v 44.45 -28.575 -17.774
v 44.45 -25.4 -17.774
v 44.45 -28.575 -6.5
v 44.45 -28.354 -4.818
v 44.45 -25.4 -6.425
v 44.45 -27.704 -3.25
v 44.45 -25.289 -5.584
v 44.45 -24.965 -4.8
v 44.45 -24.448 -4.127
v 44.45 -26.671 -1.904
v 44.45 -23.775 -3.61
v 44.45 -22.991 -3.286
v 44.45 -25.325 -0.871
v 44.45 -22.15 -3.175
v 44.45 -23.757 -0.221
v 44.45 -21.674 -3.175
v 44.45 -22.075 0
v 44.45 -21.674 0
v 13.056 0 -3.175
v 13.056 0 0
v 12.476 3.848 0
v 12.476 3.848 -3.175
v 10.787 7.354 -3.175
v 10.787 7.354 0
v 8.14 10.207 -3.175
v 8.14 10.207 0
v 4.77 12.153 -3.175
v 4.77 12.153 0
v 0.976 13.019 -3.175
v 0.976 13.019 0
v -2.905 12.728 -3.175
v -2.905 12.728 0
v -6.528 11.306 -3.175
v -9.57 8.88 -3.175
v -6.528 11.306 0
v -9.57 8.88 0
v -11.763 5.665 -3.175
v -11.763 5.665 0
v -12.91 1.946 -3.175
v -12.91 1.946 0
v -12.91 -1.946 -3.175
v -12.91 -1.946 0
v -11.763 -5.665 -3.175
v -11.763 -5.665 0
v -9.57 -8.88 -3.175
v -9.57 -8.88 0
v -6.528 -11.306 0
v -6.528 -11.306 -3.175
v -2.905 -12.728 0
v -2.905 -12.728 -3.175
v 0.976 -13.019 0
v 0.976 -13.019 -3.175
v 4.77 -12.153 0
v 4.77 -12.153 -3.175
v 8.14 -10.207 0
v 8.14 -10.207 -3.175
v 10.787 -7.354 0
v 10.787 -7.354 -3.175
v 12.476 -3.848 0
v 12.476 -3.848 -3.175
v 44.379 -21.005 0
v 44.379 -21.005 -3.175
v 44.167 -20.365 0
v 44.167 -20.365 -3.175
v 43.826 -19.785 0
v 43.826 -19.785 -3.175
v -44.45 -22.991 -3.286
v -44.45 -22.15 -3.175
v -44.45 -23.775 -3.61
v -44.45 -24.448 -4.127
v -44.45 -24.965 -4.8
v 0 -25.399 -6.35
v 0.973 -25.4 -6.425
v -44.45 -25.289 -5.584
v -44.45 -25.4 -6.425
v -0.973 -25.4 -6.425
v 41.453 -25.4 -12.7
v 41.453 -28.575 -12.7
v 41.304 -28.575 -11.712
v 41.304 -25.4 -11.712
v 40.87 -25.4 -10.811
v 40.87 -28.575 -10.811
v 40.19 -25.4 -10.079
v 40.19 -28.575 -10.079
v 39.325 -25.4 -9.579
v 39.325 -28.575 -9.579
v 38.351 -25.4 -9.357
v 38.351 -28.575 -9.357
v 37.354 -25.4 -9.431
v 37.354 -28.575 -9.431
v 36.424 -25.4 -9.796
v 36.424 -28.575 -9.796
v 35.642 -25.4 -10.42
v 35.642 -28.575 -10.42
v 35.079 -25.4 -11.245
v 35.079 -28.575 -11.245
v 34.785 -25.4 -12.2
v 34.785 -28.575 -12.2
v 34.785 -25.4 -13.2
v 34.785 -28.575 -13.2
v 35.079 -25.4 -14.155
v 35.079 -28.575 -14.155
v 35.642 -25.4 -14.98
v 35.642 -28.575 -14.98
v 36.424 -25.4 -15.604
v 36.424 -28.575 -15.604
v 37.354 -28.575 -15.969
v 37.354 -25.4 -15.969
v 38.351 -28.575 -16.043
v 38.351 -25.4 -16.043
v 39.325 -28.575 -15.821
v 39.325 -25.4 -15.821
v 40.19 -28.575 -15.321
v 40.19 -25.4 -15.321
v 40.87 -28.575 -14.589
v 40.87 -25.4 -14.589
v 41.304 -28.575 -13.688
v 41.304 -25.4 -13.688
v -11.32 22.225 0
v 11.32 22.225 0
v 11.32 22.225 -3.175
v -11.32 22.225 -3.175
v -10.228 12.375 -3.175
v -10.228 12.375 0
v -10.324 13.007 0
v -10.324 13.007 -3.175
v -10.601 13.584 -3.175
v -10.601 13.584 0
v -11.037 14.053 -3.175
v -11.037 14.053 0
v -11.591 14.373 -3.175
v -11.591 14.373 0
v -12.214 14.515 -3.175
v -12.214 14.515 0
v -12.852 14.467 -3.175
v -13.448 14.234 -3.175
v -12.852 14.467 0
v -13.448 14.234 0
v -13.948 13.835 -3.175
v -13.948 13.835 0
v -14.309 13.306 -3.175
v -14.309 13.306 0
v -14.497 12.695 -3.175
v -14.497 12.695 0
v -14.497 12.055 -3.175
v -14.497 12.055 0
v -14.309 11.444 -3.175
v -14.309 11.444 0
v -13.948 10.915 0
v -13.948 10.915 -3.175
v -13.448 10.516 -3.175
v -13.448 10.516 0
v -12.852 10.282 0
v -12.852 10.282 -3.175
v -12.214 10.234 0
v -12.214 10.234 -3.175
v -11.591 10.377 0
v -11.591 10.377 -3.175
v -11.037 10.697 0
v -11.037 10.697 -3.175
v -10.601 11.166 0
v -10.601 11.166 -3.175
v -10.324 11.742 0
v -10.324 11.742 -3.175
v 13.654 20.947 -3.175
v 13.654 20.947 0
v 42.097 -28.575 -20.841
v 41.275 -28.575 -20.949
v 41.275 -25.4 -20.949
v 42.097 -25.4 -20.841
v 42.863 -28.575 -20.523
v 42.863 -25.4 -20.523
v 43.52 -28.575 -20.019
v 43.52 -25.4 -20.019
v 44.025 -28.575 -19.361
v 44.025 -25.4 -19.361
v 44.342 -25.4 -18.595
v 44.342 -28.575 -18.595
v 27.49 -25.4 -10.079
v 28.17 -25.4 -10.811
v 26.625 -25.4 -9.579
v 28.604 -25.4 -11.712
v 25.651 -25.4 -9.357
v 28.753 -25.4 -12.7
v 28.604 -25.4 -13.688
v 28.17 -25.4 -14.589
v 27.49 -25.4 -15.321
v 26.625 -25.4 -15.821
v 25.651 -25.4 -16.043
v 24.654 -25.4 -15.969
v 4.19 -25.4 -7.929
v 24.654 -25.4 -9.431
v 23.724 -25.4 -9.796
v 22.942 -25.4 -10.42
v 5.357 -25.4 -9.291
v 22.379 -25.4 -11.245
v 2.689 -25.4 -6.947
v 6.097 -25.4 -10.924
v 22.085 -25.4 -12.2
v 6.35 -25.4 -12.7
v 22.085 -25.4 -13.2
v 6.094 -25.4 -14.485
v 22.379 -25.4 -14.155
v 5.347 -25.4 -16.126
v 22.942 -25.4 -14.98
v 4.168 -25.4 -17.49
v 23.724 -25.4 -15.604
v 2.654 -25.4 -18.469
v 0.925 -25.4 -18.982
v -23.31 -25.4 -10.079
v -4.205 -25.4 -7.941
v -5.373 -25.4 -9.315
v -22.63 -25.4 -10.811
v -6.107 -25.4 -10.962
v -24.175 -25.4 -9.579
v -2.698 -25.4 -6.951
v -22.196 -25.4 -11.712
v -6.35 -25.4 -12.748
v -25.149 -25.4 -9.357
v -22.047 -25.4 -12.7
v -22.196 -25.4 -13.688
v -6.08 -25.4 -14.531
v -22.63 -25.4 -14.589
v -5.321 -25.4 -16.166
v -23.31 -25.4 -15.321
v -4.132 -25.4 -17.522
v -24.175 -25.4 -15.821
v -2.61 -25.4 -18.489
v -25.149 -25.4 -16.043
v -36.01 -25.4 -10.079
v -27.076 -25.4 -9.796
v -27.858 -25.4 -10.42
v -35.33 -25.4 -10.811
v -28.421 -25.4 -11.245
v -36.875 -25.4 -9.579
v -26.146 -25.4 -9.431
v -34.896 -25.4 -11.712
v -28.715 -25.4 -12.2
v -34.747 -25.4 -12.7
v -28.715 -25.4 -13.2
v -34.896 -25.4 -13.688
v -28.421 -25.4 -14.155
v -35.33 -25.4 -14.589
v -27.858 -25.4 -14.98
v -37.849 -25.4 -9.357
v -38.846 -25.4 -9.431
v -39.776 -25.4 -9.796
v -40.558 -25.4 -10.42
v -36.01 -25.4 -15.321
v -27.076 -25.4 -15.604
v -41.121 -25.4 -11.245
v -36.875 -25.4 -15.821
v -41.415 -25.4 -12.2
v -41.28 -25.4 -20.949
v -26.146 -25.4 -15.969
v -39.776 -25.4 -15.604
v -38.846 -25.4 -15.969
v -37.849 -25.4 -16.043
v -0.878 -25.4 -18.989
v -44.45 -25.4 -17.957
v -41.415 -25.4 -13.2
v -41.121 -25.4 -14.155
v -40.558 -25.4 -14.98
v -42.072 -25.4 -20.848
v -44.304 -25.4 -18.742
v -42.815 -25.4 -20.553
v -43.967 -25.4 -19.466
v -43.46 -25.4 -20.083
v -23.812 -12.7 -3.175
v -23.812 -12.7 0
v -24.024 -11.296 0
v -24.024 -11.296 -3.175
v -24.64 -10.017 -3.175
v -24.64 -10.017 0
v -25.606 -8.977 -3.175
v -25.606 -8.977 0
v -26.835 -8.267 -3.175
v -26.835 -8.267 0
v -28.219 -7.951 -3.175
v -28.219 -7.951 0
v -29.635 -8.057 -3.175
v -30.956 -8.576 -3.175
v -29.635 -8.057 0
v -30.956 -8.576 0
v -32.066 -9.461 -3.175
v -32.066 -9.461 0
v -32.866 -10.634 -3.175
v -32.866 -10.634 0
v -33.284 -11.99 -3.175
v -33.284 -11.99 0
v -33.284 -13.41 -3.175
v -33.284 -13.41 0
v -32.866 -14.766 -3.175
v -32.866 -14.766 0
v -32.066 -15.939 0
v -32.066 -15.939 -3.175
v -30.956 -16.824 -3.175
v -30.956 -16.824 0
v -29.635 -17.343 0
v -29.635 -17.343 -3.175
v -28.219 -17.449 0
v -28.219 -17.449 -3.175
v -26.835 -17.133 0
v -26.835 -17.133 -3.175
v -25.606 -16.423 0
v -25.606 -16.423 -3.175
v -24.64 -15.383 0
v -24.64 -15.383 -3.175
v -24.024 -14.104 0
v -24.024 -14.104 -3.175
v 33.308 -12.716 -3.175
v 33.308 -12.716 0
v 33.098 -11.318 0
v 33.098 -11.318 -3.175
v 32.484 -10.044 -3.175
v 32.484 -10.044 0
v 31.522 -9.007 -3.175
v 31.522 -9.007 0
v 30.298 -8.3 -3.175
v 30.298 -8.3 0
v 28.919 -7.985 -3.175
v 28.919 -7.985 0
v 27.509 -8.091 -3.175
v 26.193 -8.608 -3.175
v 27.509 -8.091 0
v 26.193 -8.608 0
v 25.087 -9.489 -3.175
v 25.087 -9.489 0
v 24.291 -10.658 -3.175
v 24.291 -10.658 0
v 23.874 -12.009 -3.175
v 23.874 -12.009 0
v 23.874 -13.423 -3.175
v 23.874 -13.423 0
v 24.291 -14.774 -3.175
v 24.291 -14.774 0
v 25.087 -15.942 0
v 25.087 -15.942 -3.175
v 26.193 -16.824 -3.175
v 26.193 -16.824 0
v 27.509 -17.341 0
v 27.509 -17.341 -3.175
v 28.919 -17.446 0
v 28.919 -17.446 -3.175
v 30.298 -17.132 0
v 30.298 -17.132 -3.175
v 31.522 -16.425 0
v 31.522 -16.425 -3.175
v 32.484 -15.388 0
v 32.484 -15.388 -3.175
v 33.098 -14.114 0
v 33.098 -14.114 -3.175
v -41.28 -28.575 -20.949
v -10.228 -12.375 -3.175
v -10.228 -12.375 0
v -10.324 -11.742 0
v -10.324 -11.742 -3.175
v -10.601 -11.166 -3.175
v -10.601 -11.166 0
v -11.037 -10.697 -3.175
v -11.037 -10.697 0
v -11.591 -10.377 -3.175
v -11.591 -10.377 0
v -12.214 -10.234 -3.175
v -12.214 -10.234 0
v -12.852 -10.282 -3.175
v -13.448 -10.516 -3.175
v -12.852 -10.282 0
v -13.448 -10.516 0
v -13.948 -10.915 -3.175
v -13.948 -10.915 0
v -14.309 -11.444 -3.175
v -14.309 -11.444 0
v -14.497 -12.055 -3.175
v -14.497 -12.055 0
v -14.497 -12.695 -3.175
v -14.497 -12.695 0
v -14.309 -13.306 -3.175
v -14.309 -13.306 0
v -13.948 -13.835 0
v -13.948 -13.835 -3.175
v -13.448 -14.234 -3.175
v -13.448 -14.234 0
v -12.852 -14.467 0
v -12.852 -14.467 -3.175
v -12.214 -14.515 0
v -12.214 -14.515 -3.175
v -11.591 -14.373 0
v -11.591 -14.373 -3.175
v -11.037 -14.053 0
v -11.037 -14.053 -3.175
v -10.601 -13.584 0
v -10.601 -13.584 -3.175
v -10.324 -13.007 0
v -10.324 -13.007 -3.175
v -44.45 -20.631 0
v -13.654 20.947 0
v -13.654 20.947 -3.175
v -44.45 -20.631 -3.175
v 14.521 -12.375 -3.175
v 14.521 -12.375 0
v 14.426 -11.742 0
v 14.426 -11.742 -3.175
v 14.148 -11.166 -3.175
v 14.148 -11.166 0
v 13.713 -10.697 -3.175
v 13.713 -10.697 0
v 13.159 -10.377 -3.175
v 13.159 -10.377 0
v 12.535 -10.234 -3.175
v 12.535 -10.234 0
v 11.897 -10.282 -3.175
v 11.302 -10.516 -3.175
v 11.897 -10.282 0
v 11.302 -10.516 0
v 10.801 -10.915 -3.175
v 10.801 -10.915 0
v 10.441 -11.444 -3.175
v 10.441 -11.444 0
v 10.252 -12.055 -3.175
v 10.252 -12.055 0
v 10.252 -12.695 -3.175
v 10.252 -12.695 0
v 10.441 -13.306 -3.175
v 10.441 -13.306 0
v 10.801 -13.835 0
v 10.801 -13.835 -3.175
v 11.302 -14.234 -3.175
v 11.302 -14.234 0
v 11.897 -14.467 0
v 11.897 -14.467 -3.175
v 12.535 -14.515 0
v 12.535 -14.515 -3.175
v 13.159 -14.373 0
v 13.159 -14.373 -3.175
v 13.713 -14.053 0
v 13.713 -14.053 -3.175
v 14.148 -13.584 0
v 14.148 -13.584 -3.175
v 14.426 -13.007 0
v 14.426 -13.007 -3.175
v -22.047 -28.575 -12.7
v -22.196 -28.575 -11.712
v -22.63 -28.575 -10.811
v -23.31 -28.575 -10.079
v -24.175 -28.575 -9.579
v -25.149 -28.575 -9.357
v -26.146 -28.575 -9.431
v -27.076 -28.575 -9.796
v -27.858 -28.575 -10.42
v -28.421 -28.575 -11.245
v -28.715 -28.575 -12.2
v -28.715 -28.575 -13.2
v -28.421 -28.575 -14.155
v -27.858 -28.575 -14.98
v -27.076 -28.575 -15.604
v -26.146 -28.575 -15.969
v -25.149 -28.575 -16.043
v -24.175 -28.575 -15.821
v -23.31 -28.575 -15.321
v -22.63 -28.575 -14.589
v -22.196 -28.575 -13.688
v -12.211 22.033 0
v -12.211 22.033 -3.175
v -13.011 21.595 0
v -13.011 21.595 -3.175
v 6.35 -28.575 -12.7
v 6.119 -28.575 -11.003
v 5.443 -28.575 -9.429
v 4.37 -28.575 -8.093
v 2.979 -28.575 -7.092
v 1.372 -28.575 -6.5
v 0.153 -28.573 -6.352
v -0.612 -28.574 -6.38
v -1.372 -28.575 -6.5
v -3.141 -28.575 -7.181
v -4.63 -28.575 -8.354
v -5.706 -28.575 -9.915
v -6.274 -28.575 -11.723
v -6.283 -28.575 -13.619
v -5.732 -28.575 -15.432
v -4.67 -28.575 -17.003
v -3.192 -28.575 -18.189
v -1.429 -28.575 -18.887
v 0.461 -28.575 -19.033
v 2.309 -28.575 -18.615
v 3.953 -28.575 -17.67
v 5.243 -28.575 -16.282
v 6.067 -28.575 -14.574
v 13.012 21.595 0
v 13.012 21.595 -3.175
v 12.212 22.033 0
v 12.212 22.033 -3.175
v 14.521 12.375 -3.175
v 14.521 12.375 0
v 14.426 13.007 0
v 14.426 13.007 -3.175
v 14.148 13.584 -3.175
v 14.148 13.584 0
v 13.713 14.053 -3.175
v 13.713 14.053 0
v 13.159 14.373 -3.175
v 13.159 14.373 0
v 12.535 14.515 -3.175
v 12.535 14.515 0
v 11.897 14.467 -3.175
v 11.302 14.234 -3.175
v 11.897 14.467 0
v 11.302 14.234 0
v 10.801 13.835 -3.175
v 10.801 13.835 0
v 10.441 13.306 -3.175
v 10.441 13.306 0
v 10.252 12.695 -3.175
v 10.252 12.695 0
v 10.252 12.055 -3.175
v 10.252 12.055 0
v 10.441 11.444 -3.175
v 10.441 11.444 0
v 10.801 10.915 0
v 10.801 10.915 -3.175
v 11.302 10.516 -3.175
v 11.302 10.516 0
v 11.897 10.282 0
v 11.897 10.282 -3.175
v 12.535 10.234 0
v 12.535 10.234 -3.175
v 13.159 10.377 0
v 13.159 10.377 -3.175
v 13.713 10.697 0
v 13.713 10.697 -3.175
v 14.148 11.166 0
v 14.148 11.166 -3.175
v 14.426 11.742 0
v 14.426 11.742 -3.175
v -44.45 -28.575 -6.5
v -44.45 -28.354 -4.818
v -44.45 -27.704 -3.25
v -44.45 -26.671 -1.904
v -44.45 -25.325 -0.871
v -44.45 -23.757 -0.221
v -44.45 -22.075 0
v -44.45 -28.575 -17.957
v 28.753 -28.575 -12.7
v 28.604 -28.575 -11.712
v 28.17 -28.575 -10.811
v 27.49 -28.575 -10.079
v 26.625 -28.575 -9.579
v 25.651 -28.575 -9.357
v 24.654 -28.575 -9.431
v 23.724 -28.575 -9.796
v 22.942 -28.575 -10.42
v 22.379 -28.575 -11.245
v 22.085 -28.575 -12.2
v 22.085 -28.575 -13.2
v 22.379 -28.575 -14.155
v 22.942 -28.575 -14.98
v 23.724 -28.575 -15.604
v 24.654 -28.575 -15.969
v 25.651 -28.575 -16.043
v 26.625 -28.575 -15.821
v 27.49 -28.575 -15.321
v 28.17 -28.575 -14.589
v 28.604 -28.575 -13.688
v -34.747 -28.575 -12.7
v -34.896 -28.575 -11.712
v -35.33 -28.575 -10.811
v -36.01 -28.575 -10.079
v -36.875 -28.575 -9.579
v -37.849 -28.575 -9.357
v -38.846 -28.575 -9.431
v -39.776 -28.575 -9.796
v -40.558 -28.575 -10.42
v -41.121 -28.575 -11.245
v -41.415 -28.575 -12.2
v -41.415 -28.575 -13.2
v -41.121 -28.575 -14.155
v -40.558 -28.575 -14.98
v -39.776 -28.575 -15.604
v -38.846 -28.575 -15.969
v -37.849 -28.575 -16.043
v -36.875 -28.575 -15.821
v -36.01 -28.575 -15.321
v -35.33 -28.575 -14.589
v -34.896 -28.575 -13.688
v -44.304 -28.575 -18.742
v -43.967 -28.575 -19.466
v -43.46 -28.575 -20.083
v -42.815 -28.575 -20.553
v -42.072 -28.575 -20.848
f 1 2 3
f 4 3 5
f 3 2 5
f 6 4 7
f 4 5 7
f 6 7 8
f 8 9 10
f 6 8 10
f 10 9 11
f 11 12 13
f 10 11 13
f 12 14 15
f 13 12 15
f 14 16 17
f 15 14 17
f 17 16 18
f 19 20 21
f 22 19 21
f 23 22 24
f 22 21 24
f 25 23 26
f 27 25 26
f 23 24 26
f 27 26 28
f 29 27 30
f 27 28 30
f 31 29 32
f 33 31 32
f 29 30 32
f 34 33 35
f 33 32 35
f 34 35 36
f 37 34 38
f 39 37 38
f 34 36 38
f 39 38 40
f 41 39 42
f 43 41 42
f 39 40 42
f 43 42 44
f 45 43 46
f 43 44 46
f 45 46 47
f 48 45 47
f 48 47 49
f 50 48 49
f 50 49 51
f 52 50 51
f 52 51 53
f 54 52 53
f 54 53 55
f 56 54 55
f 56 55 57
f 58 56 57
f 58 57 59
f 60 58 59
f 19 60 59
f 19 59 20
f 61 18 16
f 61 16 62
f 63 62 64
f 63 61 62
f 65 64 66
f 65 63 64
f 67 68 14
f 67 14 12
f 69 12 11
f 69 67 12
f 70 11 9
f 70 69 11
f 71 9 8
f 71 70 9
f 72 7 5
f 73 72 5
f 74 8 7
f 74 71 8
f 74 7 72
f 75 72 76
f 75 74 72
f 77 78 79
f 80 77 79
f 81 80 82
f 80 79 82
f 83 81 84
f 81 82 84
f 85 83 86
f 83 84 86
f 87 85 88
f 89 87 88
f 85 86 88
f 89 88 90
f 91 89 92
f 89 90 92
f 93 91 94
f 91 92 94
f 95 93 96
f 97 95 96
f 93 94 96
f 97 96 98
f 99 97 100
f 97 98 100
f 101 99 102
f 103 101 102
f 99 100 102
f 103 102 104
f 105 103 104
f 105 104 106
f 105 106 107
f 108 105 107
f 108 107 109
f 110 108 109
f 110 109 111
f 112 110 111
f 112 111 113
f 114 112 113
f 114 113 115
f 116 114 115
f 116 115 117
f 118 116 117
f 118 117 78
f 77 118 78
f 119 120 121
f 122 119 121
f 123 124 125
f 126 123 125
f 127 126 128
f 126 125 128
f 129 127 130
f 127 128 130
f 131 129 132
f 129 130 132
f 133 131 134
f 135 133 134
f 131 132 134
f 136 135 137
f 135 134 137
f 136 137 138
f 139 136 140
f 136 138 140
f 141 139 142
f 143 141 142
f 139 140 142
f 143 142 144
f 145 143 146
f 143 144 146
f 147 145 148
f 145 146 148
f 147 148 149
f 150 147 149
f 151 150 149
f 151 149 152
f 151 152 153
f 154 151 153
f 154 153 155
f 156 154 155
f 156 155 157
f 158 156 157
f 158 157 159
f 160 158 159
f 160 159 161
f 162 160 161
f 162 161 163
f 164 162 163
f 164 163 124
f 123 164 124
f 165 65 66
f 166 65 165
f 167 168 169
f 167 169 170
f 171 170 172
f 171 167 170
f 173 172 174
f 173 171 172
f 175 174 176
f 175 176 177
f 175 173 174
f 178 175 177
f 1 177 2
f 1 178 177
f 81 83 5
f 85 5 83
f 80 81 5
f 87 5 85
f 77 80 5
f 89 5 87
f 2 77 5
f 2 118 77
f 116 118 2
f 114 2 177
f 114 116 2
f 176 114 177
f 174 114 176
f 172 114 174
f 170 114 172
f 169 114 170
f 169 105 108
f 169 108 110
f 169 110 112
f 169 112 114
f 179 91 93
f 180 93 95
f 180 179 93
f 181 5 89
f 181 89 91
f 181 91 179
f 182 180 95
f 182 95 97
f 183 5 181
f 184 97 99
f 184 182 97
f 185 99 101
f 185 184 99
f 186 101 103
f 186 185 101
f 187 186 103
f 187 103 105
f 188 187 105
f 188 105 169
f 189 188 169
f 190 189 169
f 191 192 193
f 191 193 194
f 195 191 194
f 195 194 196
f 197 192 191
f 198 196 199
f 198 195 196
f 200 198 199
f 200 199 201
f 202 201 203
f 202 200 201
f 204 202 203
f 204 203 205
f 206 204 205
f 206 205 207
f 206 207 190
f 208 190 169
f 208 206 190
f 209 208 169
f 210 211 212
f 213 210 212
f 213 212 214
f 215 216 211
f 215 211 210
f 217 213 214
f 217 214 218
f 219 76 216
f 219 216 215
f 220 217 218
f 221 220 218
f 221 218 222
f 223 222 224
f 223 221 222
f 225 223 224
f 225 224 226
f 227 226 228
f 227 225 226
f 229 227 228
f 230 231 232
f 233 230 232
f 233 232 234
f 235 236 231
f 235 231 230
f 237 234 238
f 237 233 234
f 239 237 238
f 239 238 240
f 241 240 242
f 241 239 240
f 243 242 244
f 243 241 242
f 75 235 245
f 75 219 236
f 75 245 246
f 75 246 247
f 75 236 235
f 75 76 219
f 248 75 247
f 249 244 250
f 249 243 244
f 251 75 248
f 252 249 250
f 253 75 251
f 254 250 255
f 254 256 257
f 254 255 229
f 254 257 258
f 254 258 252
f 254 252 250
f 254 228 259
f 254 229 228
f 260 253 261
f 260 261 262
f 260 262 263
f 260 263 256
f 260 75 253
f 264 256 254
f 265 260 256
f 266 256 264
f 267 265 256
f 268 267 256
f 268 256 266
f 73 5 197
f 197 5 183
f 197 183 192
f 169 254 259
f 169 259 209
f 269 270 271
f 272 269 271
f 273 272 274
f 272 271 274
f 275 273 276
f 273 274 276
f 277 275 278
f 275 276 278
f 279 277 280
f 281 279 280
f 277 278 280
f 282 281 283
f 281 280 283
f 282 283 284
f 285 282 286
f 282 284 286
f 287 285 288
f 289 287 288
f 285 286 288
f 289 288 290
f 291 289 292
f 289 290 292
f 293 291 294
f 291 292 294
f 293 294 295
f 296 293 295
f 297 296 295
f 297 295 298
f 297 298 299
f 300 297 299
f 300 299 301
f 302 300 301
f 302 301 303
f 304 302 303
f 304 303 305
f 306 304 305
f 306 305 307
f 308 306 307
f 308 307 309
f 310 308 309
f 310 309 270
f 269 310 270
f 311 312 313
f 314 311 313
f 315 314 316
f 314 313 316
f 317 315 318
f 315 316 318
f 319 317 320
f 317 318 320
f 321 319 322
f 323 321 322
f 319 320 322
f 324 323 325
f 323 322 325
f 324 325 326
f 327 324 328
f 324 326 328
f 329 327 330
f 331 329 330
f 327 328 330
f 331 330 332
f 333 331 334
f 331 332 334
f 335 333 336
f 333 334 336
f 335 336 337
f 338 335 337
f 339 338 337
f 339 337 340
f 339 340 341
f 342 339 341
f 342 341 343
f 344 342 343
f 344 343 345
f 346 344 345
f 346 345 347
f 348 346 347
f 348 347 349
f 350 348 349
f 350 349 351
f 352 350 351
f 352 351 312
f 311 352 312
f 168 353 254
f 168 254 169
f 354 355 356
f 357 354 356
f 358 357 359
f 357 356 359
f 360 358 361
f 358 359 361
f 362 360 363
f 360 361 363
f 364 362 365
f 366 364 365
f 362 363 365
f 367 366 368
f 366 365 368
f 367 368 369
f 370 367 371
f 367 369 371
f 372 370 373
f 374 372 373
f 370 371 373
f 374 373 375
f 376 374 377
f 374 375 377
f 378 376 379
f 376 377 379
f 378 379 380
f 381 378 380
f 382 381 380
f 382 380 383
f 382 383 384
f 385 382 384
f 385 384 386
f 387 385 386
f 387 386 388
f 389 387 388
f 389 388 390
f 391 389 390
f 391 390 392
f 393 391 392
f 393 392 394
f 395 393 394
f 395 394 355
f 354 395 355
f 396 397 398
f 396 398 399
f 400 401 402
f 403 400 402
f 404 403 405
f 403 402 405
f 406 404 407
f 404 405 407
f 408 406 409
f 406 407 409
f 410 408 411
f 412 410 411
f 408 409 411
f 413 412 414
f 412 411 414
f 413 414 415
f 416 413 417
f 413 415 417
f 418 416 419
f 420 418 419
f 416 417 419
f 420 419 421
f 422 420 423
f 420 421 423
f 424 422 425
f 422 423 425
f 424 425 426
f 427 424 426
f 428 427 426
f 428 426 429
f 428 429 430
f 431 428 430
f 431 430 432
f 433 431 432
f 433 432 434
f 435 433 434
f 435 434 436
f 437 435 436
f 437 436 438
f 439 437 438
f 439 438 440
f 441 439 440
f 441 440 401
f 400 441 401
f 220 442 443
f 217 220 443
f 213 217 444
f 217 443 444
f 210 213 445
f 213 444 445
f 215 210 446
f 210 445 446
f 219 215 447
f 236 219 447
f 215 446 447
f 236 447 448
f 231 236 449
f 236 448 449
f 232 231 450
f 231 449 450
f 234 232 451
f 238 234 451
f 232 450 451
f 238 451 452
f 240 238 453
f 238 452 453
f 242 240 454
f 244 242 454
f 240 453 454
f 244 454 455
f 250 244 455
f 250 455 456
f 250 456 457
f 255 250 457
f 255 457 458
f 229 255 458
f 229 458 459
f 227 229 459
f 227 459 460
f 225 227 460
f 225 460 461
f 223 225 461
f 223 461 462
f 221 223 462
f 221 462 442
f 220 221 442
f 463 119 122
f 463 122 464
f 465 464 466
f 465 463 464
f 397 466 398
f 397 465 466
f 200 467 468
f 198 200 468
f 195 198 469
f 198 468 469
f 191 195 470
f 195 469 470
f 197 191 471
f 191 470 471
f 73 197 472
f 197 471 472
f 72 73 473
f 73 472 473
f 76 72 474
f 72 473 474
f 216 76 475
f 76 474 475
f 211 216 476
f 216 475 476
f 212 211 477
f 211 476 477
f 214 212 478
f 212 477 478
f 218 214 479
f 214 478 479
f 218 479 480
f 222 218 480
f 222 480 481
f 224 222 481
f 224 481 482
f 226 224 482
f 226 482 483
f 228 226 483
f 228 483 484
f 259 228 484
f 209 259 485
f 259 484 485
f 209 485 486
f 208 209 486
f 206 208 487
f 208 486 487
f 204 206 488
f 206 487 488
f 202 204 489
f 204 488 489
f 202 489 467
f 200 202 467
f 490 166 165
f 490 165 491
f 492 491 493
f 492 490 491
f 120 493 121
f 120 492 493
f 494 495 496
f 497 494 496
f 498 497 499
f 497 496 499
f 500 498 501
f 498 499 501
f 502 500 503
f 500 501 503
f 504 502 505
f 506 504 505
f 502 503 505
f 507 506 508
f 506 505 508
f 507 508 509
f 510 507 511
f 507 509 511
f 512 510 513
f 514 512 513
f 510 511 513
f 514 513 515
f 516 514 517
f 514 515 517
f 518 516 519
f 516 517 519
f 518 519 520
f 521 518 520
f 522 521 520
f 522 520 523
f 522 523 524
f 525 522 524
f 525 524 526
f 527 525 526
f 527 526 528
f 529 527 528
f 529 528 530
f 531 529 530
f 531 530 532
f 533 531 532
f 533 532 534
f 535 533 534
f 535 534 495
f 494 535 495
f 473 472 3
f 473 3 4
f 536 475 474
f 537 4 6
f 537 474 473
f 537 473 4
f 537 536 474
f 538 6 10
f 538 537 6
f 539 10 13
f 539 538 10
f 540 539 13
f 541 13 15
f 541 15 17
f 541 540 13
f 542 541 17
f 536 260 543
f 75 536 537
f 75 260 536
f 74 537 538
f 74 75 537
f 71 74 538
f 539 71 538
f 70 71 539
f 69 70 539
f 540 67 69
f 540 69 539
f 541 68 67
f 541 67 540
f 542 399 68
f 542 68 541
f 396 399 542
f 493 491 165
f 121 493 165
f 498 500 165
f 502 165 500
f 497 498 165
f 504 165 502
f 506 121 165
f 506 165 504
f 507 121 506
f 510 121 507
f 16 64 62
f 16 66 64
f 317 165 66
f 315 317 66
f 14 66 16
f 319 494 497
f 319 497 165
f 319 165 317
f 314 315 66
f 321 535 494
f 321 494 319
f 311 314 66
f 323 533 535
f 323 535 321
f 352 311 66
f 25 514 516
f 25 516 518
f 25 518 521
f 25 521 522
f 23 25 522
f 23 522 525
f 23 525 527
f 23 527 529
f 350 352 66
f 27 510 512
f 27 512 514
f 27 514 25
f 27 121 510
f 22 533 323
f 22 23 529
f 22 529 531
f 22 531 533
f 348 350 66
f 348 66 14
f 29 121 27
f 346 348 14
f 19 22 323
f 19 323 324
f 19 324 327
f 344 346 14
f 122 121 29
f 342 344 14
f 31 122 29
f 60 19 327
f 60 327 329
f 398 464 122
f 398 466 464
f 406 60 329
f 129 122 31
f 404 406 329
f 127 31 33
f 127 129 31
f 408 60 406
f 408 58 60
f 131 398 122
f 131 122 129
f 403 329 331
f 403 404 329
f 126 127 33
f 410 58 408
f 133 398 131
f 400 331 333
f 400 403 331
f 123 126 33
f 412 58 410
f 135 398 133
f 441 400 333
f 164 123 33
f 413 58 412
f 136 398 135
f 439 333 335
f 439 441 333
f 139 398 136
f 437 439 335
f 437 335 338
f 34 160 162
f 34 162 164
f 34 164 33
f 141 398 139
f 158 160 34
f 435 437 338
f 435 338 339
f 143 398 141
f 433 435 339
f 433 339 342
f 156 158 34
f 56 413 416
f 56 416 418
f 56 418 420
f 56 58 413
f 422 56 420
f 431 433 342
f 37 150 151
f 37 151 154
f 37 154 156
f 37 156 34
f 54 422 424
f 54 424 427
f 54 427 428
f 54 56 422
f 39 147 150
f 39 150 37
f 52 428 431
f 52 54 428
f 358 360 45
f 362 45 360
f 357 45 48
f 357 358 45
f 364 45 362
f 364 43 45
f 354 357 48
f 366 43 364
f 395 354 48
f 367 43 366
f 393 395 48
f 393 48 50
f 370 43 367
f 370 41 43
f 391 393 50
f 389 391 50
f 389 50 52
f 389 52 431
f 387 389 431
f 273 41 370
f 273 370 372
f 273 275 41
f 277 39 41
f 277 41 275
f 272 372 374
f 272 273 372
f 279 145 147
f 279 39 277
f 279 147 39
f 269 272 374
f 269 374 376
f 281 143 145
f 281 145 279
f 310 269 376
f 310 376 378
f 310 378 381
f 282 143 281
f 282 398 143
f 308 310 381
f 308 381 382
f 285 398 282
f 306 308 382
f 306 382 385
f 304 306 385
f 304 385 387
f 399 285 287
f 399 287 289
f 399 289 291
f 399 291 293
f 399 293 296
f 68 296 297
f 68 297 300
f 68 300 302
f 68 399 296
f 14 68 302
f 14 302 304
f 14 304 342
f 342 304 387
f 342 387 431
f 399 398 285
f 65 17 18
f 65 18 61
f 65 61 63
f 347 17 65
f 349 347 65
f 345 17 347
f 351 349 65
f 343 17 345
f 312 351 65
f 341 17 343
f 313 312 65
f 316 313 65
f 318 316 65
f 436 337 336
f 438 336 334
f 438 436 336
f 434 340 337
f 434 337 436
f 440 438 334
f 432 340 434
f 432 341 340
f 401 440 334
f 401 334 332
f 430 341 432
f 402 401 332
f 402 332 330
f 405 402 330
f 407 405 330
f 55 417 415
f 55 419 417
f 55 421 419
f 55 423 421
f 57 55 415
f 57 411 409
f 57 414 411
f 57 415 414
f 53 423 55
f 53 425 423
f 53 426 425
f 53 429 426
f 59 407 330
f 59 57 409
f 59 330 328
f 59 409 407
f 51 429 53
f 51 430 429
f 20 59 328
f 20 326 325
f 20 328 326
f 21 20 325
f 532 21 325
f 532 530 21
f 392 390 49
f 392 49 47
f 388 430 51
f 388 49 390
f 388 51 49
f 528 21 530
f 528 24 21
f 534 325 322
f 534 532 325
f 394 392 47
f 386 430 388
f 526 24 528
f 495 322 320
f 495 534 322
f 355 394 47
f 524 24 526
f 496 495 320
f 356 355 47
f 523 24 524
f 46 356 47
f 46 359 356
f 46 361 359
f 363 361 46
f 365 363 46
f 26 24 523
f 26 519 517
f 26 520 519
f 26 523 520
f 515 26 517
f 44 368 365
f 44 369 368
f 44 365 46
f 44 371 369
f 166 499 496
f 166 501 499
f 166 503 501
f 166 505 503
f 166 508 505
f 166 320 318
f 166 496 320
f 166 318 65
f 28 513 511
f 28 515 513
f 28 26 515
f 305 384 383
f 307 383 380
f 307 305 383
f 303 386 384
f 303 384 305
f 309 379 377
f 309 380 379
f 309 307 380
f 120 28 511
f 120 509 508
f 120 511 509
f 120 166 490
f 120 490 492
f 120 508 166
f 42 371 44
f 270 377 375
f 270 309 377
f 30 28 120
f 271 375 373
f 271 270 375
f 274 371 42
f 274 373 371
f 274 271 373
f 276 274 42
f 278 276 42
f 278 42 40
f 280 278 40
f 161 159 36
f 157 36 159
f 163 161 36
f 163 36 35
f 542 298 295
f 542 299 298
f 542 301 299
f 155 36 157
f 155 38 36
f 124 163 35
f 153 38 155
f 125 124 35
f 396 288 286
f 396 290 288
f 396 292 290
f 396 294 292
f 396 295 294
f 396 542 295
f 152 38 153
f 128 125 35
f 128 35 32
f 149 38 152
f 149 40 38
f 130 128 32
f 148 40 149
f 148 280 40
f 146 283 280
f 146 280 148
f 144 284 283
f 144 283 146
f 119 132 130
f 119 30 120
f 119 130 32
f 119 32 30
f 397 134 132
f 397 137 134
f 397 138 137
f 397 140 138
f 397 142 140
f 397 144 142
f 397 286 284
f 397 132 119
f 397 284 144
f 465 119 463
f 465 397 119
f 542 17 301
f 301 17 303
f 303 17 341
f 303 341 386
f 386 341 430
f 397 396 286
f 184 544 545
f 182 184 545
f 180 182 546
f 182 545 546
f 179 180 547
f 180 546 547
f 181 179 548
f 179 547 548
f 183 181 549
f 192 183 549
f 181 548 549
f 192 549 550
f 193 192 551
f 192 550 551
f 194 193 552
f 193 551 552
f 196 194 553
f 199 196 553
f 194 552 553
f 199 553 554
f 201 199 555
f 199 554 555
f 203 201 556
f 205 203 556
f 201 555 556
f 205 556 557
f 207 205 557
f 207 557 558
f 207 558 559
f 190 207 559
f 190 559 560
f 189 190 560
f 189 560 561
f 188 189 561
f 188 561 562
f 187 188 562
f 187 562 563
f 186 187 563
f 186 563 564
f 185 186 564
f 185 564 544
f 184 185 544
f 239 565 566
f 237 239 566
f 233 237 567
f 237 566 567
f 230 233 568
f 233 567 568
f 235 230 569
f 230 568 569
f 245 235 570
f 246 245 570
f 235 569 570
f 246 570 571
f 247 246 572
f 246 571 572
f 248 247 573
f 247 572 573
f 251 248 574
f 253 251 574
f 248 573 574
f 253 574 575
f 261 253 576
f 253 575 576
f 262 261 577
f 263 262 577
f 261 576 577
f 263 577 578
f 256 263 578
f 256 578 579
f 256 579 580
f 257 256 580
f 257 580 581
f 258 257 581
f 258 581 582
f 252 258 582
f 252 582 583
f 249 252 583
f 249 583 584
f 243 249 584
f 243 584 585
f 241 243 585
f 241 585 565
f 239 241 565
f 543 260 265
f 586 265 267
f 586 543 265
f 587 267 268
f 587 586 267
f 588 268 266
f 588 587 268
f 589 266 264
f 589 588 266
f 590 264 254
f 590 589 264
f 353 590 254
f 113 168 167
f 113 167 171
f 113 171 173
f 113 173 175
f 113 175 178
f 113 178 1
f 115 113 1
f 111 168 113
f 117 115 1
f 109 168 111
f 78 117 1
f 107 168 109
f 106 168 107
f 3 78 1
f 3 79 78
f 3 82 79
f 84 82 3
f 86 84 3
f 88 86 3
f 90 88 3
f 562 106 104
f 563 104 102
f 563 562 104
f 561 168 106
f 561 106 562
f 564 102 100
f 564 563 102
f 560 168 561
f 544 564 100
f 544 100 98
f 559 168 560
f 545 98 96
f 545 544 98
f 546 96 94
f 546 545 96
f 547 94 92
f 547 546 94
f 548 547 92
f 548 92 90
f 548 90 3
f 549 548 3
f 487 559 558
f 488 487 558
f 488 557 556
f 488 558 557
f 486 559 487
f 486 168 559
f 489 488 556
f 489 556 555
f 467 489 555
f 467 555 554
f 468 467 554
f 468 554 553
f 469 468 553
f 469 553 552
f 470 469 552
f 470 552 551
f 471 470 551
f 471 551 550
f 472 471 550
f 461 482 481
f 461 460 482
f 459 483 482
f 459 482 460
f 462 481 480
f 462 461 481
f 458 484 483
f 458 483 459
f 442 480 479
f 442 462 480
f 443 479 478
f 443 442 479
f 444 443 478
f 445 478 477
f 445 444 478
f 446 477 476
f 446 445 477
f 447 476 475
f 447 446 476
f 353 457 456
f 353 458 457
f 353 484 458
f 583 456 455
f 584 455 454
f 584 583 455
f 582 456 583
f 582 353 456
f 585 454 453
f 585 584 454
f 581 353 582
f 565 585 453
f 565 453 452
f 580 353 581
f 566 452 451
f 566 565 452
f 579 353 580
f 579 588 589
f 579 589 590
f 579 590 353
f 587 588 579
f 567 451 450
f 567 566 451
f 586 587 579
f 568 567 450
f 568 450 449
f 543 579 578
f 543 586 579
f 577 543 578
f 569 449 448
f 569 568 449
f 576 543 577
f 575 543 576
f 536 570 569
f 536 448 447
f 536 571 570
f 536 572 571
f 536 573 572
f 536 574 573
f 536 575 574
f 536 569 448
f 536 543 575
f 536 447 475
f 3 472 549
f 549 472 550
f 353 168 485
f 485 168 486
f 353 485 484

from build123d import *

# Parameters (mm, degrees)
BOSS_EXTRUDE1_DEPTH = 44.45
SKETCH2_OUTSIDE_W   = 111.802
SKETCH2_OUTSIDE_H   = 43.857
SKETCH2_OUTSIDE_R   = 3.3528
SKETCH2_OUTSIDE_R_2 = 6.35
CUT_EXTRUDE3_DEPTH  = 51.8
SKETCH3_OUTSIDE_W   = 111.802
SKETCH3_OUTSIDE_H   = 73.702
SKETCH3_OUTSIDE_R   = 2.1463
SKETCH3_OUTSIDE_R_2 = 13.0556
SKETCH3_OUTSIDE_R_3 = 4.7625
SKETCH3_OUTSIDE_R_4 = 4.743651166
CUT_EXTRUDE4_DEPTH  = 21.948744152


with BuildPart() as part:
    # Sketch1 → Boss-Extrude1 (new body, symmetric)
    with BuildSketch(Plane.ZY):
        with BuildLine():
            Line((-20.955, -28.575), (-6.5, -28.575))
            ThreePointArc((-6.5, -28.575), (-1.903805922, -26.671194078), (0, -22.075))
            Line((0, -22.075), (0, 22.225))
            Line((0, 22.225), (-3.175, 22.225))
            Line((-3.175, 22.225), (-3.175, -22.15))
            ThreePointArc((-3.175, -22.15), (-4.126902961, -24.448097039), (-6.425, -25.4))
            Line((-6.425, -25.4), (-20.955, -25.4))
            Line((-20.955, -25.4), (-20.955, -28.575))
        make_face()
    extrude(amount=BOSS_EXTRUDE1_DEPTH, both=True)

    # Sketch2 outside → Cut-Extrude3 (cut, through all)
    with BuildSketch(Plane.XZ.offset(28.575)):
        with Locations((0, -10.4775)):
            Rectangle(SKETCH2_OUTSIDE_W, SKETCH2_OUTSIDE_H)
        with BuildLine():
            Line((-41.280304188, -20.948744152), (41.275, -20.948744152))
            ThreePointArc((41.275, -20.948744152), (43.52006403, -20.018808183), (44.45, -17.773744152))
            Line((44.45, -17.773744152), (44.45, 4.535349672))
            Line((44.45, 4.535349672), (-44.455304188, 4.535349672))
            Line((-44.455304188, 4.535349672), (-44.455304188, -17.773744152))
            ThreePointArc((-44.455304188, -17.773744152), (-43.525368218, -20.018808183), (-41.280304188, -20.948744152))
        make_face(mode=Mode.SUBTRACT)
        with Locations((-38.1, -12.7)):
            Circle(SKETCH2_OUTSIDE_R)
        with Locations((-25.4, -12.7)):
            Circle(SKETCH2_OUTSIDE_R)
        with Locations((0, -12.7)):
            Circle(SKETCH2_OUTSIDE_R_2)
        with Locations((25.4, -12.7)):
            Circle(SKETCH2_OUTSIDE_R)
        with Locations((38.1, -12.7)):
            Circle(SKETCH2_OUTSIDE_R)
    extrude(amount=-CUT_EXTRUDE3_DEPTH, mode=Mode.SUBTRACT)

    # Sketch3 outside → Cut-Extrude4 (cut, through all)
    with BuildSketch(Plane.XY):
        with Locations((0, -3.175)):
            Rectangle(SKETCH3_OUTSIDE_W, SKETCH3_OUTSIDE_H)
        with BuildLine():
            Line((-13.653876698, 20.947210396), (-44.450826739, -20.631729198))
            Line((-44.450826739, -20.631729198), (-44.450826739, -28.575))
            Line((-44.450826739, -28.575), (44.45, -28.575))
            Line((44.45, -28.575), (44.45, -21.674369393))
            ThreePointArc((44.45, -21.674369393), (44.29004015, -20.679302615), (43.826278492, -19.784500865))
            Line((43.826278492, -19.784500865), (13.654037866, 20.947321174))
            ThreePointArc((13.654037866, 20.947321174), (12.531096243, 21.893026448), (11.102759374, 22.232452646))
            Line((11.102759374, 22.232452646), (-11.10251615, 22.232452646))
            ThreePointArc((-11.10251615, 22.232452646), (-12.530914579, 21.892995438), (-13.653876698, 20.947210396))
        make_face(mode=Mode.SUBTRACT)
        with Locations((-12.374792935, 12.374792935)):
            Circle(SKETCH3_OUTSIDE_R)
        with Locations((12.374792935, 12.374792935)):
            Circle(SKETCH3_OUTSIDE_R)
        Circle(SKETCH3_OUTSIDE_R_2)
        with Locations((-28.575, -12.7)):
            Circle(SKETCH3_OUTSIDE_R_3)
        with Locations((-12.374792935, -12.374792935)):
            Circle(SKETCH3_OUTSIDE_R)
        with Locations((12.374792935, -12.374792935)):
            Circle(SKETCH3_OUTSIDE_R)
        with Locations((28.564780042, -12.715837646)):
            Circle(SKETCH3_OUTSIDE_R_4)
    extrude(amount=-CUT_EXTRUDE4_DEPTH, mode=Mode.SUBTRACT)


solid = part.part
